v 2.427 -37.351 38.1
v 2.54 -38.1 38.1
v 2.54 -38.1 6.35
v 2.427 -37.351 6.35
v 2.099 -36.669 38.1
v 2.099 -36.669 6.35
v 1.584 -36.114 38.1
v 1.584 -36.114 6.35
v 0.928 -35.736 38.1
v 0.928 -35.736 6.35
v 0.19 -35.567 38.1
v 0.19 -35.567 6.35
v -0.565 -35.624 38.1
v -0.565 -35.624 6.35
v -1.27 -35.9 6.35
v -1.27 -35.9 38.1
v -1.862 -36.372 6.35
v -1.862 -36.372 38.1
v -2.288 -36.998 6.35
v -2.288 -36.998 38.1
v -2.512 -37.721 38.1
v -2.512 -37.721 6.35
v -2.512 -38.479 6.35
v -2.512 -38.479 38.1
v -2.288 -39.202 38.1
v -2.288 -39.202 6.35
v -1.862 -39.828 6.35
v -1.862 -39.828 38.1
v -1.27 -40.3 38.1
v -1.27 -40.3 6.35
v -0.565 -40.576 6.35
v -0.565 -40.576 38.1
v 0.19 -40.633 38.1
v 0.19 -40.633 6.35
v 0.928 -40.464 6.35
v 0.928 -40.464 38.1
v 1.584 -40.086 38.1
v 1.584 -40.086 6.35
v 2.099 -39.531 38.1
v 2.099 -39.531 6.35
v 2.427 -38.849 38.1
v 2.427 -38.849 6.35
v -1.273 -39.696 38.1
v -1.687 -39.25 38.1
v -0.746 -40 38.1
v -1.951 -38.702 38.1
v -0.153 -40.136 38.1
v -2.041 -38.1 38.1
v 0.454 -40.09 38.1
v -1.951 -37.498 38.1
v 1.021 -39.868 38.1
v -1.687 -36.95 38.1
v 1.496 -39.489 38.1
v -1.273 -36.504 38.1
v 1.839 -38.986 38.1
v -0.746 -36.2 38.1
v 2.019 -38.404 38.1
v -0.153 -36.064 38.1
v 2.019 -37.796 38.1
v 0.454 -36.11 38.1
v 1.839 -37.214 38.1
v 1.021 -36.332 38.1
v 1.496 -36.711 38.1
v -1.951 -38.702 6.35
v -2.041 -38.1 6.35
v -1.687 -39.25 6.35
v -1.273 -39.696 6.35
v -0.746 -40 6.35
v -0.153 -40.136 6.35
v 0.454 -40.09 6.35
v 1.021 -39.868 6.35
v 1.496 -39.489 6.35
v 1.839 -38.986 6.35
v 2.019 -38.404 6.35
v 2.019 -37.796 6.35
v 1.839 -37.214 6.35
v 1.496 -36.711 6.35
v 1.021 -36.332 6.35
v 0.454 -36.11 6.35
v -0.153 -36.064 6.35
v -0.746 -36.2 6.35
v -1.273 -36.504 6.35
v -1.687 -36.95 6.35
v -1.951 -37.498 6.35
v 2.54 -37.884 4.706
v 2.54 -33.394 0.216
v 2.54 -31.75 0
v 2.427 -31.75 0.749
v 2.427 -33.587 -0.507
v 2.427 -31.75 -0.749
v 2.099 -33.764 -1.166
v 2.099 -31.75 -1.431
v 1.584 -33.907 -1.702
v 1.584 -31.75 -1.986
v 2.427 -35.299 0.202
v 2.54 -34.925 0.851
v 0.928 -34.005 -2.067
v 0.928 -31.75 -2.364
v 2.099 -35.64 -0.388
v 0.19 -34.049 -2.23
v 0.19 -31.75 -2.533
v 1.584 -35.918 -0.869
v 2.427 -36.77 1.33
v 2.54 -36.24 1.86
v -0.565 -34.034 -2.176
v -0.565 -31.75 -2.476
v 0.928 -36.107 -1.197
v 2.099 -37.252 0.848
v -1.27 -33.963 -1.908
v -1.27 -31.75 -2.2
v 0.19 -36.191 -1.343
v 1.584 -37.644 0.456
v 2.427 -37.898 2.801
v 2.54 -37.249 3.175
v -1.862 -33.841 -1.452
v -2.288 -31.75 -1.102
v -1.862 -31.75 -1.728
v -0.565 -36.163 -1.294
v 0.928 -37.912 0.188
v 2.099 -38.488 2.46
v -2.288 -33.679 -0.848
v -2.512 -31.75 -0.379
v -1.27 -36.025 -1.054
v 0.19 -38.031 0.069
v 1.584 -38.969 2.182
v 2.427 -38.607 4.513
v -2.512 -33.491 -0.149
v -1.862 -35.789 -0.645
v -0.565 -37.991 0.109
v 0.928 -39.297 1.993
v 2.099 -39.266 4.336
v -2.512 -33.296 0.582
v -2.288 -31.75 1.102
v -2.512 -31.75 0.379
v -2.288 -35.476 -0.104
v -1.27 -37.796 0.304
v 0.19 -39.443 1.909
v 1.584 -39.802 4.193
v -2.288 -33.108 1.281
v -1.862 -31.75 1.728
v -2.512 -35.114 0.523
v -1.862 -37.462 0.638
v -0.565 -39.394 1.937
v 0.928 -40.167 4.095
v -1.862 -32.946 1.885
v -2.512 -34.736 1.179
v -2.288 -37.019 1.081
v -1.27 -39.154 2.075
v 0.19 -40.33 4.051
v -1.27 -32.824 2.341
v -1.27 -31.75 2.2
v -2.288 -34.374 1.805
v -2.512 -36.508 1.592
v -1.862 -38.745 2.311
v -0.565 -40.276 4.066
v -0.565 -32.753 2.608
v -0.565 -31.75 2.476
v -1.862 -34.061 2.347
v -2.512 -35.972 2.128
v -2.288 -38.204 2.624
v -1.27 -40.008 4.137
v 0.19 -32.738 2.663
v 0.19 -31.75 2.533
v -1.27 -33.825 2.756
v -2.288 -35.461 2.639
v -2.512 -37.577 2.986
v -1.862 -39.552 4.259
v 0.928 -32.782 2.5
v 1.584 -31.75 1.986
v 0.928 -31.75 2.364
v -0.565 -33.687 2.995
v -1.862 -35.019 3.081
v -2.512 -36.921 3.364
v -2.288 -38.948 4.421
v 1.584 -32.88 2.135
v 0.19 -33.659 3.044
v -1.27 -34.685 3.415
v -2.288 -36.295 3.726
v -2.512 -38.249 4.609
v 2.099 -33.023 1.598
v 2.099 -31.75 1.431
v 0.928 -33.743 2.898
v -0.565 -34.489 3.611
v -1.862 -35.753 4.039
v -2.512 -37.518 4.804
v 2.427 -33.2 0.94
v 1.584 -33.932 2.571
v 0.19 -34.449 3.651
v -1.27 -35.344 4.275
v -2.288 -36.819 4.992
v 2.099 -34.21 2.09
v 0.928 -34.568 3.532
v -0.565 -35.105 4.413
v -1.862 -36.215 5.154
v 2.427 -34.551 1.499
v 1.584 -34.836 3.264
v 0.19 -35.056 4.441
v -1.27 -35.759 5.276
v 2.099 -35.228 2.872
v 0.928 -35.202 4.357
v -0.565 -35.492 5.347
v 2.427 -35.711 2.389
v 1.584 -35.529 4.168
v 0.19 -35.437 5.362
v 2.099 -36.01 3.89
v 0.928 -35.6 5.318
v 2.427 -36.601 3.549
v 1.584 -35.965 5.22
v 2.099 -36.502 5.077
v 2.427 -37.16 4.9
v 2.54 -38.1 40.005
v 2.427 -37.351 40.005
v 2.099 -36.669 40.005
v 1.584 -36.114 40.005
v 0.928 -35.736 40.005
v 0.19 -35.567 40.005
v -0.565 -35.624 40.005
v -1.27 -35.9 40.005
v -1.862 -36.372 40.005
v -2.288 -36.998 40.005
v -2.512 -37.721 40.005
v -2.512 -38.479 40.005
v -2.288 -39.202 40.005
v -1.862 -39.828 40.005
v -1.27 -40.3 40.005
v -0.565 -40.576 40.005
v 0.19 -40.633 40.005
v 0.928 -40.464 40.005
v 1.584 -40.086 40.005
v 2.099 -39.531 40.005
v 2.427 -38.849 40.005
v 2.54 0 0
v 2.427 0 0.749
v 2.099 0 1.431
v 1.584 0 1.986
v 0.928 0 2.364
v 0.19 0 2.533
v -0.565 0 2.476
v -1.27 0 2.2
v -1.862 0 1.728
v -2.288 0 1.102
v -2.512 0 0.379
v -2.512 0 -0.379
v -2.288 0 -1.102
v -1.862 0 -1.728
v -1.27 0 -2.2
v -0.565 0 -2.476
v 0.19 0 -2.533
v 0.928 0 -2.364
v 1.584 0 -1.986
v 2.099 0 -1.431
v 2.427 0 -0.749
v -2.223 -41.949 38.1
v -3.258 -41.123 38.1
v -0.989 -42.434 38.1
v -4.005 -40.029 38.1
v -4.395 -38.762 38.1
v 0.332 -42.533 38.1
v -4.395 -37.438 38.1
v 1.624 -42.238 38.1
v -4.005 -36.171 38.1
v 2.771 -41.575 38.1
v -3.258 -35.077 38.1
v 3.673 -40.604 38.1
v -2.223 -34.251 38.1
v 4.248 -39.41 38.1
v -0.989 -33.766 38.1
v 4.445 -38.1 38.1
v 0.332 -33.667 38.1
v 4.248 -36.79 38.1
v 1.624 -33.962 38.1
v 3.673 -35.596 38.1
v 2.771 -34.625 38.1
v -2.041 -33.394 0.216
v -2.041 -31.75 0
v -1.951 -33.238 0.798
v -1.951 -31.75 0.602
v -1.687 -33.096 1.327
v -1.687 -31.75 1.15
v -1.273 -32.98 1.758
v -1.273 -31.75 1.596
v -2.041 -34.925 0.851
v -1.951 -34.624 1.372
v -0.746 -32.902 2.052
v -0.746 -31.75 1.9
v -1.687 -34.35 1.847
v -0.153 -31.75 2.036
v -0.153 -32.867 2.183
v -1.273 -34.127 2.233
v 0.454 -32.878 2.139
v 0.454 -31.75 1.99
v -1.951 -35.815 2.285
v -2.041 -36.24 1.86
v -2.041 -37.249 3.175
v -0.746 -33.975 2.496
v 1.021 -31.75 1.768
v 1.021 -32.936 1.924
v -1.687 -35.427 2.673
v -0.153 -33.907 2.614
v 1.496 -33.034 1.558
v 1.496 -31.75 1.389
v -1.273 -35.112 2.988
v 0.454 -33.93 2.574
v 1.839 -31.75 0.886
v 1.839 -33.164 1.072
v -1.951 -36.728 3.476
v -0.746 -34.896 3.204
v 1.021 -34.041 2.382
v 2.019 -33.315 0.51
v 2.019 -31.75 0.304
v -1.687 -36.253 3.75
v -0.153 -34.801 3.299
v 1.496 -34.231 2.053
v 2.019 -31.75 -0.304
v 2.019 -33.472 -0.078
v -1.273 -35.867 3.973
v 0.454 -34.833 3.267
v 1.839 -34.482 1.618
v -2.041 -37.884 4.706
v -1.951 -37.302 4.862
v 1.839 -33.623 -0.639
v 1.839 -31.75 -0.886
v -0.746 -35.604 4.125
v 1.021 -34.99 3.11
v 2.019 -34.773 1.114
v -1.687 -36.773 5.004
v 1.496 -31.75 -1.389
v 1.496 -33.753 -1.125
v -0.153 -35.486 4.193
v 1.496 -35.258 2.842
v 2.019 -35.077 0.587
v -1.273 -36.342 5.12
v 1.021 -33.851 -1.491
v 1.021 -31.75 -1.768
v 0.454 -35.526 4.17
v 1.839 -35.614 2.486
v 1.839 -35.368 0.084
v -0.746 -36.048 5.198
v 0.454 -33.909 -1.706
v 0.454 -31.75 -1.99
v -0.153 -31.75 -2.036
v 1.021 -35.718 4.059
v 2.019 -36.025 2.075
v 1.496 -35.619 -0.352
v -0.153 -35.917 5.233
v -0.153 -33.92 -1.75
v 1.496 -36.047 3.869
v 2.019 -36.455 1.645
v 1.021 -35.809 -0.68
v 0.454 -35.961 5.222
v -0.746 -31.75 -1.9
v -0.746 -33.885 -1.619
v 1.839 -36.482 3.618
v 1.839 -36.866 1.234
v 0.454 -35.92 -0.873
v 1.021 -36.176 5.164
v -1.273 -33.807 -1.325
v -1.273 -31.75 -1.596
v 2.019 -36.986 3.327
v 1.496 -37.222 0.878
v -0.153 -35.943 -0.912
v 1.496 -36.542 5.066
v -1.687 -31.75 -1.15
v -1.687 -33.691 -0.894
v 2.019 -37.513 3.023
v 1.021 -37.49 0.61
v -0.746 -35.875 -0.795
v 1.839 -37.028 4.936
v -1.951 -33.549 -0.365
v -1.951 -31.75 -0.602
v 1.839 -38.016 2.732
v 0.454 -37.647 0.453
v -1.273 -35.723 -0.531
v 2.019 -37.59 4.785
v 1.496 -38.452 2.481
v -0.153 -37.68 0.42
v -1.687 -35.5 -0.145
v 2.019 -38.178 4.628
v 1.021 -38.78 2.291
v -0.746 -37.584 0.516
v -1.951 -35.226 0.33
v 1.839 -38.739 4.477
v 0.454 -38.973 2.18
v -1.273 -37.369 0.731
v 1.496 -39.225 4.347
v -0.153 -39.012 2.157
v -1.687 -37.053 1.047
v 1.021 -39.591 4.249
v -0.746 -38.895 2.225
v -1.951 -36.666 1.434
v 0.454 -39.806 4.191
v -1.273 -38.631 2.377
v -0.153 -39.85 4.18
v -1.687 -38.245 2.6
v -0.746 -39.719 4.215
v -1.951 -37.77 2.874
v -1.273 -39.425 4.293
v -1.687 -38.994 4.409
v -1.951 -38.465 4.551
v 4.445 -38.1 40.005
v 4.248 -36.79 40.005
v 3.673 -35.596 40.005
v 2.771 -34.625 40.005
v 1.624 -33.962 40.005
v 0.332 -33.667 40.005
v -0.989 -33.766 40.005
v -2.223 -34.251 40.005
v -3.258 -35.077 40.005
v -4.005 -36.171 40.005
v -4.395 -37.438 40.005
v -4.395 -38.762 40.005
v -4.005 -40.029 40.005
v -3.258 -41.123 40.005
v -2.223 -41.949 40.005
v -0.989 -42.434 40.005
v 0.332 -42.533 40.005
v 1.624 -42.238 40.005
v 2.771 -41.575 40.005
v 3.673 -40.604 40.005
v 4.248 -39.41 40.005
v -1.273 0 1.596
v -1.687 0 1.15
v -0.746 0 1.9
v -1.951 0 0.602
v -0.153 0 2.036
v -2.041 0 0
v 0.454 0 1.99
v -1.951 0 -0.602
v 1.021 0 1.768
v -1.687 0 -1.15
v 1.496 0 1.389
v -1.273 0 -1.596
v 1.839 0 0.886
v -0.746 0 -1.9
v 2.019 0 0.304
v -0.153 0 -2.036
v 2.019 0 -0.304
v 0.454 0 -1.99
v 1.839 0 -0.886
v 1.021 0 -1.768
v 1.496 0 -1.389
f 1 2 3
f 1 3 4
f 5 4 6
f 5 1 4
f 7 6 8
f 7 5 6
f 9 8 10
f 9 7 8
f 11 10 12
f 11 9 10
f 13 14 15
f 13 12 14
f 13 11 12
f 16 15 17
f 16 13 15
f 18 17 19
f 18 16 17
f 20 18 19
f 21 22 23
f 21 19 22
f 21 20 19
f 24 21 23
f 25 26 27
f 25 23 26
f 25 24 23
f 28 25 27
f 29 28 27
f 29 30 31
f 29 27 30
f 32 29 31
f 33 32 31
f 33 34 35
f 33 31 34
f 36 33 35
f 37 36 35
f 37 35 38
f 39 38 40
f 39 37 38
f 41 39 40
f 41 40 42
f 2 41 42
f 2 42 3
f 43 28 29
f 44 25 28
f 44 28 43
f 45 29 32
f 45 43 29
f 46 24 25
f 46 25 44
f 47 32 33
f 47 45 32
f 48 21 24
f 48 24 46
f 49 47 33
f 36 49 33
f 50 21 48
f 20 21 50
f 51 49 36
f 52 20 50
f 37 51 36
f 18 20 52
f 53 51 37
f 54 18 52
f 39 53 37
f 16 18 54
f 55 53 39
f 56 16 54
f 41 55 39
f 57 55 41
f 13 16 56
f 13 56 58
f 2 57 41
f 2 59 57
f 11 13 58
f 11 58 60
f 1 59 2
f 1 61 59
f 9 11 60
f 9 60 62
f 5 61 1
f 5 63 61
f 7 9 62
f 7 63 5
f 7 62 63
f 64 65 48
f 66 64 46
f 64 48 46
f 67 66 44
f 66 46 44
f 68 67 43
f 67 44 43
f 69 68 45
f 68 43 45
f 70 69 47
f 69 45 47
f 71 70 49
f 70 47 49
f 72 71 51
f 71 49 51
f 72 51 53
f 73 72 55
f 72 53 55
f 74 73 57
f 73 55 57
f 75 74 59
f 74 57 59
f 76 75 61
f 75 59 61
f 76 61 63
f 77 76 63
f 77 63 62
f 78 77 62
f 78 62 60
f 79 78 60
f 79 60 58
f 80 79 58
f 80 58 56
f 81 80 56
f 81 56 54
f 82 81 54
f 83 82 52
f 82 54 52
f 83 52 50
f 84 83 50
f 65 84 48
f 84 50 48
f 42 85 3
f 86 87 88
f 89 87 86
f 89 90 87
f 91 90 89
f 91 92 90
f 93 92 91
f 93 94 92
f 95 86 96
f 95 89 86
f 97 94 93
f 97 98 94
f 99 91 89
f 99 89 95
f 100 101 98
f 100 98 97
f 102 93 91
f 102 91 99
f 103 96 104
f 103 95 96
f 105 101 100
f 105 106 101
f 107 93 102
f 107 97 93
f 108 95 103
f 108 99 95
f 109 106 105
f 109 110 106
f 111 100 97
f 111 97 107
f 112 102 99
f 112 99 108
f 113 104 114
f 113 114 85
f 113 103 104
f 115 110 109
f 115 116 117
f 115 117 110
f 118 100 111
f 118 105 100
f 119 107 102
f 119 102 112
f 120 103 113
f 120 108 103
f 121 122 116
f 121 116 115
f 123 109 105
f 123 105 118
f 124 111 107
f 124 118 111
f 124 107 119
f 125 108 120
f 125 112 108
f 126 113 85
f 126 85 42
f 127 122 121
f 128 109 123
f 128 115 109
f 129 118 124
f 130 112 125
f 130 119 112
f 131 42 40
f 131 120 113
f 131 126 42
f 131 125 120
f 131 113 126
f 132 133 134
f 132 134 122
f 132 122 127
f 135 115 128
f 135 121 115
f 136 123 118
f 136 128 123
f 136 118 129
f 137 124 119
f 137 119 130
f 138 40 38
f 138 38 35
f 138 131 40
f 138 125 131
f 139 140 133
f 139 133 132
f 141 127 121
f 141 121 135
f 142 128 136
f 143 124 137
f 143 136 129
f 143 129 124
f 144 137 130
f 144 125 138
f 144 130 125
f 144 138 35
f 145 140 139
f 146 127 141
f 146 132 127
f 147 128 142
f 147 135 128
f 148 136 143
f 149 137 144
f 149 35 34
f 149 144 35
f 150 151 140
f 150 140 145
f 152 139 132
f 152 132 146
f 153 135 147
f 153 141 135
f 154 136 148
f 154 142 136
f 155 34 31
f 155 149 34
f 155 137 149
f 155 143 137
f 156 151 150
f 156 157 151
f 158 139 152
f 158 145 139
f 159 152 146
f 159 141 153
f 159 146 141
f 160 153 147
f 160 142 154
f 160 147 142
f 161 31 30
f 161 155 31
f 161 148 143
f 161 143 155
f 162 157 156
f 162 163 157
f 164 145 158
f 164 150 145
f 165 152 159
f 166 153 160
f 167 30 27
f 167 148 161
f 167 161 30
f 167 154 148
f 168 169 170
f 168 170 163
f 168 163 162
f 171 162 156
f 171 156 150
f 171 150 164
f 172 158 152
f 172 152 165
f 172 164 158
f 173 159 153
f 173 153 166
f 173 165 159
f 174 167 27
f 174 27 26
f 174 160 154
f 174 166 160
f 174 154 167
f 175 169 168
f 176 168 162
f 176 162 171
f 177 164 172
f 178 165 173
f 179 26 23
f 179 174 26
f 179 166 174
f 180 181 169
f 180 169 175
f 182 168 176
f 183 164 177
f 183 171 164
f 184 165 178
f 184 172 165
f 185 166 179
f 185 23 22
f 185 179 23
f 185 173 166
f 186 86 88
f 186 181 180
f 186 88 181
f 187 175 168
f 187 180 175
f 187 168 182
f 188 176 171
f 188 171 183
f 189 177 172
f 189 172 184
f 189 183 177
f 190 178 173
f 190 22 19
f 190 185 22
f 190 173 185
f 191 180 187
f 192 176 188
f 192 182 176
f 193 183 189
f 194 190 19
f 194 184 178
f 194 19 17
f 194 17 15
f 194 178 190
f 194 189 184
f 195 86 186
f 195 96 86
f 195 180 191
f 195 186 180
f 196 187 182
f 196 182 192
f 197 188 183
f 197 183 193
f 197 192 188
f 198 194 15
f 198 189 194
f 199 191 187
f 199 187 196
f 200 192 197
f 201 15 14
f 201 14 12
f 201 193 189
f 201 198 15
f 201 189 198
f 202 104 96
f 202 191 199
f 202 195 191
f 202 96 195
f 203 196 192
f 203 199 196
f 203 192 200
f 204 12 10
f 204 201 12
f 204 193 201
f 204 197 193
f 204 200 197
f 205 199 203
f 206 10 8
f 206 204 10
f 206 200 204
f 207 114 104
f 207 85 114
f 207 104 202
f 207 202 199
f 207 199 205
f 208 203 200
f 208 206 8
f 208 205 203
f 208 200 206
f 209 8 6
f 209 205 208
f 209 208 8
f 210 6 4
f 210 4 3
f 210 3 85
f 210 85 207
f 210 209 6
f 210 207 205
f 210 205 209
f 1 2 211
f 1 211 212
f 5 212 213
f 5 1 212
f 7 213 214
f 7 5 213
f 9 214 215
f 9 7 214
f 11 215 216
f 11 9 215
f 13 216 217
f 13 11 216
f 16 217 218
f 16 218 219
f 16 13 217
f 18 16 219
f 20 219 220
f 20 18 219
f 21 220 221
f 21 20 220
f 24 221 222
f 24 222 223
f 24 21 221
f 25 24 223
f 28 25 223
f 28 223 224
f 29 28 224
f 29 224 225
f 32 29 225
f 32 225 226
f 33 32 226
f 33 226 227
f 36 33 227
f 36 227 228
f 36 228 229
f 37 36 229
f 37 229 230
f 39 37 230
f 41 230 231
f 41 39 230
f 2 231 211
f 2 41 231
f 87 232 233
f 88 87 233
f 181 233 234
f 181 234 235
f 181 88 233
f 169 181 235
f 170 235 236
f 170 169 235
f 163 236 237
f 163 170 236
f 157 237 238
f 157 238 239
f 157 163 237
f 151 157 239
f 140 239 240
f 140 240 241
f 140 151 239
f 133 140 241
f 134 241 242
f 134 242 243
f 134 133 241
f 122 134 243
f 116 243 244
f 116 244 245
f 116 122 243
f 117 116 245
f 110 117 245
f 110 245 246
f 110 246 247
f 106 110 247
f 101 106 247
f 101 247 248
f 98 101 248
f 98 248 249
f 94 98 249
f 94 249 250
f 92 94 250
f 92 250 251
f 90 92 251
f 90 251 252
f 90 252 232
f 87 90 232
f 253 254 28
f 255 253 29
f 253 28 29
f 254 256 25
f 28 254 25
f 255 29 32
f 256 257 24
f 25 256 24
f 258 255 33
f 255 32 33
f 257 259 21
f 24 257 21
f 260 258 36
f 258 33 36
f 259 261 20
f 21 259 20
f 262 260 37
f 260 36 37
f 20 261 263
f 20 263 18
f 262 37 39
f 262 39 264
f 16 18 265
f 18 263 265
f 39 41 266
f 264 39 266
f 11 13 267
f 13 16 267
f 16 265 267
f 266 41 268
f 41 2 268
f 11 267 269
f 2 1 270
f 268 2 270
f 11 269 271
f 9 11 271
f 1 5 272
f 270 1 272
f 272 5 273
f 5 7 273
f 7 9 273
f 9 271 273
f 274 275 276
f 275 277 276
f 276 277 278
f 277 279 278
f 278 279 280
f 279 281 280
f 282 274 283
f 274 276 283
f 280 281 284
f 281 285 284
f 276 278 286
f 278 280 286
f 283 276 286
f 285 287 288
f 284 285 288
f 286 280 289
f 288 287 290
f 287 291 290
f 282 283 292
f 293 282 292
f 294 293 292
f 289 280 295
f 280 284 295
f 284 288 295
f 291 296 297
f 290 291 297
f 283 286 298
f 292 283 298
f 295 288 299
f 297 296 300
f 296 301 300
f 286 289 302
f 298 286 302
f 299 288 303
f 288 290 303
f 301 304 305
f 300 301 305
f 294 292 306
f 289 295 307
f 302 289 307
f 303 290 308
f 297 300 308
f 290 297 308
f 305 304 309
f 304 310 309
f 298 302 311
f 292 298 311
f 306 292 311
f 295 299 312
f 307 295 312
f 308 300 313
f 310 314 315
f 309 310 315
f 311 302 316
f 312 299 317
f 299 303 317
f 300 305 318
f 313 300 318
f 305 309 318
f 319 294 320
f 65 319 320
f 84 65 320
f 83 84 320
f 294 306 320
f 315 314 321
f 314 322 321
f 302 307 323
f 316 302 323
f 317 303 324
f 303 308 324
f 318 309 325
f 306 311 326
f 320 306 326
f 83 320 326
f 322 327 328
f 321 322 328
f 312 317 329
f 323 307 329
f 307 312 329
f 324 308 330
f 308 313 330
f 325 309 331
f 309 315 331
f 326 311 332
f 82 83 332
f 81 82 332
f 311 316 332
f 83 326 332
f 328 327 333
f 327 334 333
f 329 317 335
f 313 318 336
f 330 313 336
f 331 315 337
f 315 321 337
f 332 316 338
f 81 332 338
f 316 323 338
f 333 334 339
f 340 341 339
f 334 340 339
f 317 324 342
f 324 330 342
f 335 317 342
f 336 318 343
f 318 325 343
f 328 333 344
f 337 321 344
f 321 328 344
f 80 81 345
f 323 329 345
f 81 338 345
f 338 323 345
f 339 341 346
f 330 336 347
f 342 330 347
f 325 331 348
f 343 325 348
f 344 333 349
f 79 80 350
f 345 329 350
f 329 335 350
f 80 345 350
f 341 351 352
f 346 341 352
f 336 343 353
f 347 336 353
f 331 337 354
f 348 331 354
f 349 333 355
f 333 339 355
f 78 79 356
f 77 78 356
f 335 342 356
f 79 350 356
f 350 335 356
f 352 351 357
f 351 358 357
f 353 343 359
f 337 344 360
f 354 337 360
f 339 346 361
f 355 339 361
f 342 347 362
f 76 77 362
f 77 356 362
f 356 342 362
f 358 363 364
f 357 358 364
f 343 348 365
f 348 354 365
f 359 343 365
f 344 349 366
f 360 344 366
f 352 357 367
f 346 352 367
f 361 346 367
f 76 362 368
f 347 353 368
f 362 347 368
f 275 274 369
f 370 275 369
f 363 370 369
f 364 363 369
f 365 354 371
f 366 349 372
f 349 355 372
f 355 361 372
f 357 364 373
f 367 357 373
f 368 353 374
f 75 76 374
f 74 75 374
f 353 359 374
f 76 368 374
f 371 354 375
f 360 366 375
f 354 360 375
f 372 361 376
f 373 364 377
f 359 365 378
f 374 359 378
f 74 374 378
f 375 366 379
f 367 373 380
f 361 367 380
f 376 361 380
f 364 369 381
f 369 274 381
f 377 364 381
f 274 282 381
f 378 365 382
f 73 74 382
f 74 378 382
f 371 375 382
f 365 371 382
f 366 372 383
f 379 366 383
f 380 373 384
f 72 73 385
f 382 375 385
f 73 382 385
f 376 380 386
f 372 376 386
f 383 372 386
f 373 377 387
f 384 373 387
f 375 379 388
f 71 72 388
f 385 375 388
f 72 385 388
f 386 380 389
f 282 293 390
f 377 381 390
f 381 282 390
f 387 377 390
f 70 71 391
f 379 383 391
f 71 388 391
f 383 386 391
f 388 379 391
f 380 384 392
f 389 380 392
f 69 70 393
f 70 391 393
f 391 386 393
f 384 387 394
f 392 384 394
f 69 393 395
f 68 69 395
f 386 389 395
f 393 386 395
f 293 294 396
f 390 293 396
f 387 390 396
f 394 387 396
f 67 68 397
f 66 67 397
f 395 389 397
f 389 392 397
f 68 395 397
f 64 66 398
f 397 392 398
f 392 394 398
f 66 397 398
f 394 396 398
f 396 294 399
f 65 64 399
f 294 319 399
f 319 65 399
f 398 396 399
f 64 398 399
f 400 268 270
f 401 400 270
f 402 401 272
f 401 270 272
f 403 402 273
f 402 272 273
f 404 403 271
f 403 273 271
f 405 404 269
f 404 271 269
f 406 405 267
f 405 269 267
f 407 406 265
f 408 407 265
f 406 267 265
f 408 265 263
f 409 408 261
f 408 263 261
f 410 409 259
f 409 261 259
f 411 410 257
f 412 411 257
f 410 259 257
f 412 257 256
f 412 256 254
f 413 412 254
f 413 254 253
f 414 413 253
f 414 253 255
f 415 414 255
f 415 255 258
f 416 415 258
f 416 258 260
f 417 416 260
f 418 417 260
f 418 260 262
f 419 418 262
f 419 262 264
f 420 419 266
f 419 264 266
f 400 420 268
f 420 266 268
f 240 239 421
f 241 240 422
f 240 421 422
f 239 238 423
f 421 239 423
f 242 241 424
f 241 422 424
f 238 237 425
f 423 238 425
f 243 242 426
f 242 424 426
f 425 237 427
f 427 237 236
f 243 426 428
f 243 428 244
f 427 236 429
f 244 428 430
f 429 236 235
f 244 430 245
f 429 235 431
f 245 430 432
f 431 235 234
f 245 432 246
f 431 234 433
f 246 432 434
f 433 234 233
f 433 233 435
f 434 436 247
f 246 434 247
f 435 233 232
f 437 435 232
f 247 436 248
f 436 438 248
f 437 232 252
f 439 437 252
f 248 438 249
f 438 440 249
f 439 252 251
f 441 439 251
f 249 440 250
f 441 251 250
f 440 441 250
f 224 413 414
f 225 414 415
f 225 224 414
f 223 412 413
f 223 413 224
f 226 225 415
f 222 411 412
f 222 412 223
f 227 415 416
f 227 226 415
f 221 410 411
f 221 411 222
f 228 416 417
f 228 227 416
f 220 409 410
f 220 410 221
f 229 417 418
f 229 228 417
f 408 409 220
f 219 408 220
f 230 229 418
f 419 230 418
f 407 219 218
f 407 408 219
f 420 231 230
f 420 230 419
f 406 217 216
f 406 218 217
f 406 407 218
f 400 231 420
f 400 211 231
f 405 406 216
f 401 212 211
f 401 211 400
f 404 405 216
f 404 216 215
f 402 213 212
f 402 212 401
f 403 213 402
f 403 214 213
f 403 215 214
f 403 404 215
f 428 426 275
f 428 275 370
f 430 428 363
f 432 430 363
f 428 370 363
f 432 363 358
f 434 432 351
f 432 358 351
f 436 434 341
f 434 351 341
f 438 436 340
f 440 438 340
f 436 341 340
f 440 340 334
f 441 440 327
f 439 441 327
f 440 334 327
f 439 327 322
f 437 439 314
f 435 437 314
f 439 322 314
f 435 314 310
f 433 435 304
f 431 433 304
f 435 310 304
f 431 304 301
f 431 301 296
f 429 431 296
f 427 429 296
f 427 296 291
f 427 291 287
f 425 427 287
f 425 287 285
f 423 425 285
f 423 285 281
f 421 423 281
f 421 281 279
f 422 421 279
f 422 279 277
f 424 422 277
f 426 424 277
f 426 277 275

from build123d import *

# Parameters (mm, degrees)
F0_R     = 2.54
F3_R     = 4.445
F3_R_2   = 2.54
F4_DEPTH = 1.905
F5_R     = 2.0414079802


with BuildPart() as f2:
    # F2: sweep along a path in F1
    with BuildLine(Plane.YZ) as f2_path:
        Line((0, 0), (-31.75, 0))
        ThreePointArc((-31.75, 0), (-36.2401280605, 1.8598719395), (-38.1, 6.35))
        Line((-38.1, 6.35), (-38.1, 38.1))
    # F0 (on Front) → F2 (sweep)
    with BuildSketch(Plane.XZ):
        Circle(F0_R)
    sweep(path=f2_path.line)

    # F6: sweep along a path in F1
    with BuildLine(Plane.YZ) as f6_path:
        Line((0, 0), (-31.75, 0))
        ThreePointArc((-31.75, 0), (-36.2401280605, 1.8598719395), (-38.1, 6.35))
        Line((-38.1, 6.35), (-38.1, 38.1))
    # F5 (on face) → F6 (sweep, cut)
    with BuildSketch(Plane(origin=(0, 0, 0), x_dir=(-1, 0, 0), z_dir=(0, 1, 0))):
        Circle(F5_R)
    sweep(path=f6_path.line, mode=Mode.SUBTRACT)


with BuildPart() as f4:
    # F3 (on face) → F4 (new body)
    with BuildSketch(Plane.XY.offset(38.1)):
        with Locations((0, -38.1)):
            Circle(F3_R)
        with Locations((0, -38.1)):
            Circle(F3_R_2, mode=Mode.SUBTRACT)
    extrude(amount=F4_DEPTH)


solid = Compound([f2.part, f4.part])
